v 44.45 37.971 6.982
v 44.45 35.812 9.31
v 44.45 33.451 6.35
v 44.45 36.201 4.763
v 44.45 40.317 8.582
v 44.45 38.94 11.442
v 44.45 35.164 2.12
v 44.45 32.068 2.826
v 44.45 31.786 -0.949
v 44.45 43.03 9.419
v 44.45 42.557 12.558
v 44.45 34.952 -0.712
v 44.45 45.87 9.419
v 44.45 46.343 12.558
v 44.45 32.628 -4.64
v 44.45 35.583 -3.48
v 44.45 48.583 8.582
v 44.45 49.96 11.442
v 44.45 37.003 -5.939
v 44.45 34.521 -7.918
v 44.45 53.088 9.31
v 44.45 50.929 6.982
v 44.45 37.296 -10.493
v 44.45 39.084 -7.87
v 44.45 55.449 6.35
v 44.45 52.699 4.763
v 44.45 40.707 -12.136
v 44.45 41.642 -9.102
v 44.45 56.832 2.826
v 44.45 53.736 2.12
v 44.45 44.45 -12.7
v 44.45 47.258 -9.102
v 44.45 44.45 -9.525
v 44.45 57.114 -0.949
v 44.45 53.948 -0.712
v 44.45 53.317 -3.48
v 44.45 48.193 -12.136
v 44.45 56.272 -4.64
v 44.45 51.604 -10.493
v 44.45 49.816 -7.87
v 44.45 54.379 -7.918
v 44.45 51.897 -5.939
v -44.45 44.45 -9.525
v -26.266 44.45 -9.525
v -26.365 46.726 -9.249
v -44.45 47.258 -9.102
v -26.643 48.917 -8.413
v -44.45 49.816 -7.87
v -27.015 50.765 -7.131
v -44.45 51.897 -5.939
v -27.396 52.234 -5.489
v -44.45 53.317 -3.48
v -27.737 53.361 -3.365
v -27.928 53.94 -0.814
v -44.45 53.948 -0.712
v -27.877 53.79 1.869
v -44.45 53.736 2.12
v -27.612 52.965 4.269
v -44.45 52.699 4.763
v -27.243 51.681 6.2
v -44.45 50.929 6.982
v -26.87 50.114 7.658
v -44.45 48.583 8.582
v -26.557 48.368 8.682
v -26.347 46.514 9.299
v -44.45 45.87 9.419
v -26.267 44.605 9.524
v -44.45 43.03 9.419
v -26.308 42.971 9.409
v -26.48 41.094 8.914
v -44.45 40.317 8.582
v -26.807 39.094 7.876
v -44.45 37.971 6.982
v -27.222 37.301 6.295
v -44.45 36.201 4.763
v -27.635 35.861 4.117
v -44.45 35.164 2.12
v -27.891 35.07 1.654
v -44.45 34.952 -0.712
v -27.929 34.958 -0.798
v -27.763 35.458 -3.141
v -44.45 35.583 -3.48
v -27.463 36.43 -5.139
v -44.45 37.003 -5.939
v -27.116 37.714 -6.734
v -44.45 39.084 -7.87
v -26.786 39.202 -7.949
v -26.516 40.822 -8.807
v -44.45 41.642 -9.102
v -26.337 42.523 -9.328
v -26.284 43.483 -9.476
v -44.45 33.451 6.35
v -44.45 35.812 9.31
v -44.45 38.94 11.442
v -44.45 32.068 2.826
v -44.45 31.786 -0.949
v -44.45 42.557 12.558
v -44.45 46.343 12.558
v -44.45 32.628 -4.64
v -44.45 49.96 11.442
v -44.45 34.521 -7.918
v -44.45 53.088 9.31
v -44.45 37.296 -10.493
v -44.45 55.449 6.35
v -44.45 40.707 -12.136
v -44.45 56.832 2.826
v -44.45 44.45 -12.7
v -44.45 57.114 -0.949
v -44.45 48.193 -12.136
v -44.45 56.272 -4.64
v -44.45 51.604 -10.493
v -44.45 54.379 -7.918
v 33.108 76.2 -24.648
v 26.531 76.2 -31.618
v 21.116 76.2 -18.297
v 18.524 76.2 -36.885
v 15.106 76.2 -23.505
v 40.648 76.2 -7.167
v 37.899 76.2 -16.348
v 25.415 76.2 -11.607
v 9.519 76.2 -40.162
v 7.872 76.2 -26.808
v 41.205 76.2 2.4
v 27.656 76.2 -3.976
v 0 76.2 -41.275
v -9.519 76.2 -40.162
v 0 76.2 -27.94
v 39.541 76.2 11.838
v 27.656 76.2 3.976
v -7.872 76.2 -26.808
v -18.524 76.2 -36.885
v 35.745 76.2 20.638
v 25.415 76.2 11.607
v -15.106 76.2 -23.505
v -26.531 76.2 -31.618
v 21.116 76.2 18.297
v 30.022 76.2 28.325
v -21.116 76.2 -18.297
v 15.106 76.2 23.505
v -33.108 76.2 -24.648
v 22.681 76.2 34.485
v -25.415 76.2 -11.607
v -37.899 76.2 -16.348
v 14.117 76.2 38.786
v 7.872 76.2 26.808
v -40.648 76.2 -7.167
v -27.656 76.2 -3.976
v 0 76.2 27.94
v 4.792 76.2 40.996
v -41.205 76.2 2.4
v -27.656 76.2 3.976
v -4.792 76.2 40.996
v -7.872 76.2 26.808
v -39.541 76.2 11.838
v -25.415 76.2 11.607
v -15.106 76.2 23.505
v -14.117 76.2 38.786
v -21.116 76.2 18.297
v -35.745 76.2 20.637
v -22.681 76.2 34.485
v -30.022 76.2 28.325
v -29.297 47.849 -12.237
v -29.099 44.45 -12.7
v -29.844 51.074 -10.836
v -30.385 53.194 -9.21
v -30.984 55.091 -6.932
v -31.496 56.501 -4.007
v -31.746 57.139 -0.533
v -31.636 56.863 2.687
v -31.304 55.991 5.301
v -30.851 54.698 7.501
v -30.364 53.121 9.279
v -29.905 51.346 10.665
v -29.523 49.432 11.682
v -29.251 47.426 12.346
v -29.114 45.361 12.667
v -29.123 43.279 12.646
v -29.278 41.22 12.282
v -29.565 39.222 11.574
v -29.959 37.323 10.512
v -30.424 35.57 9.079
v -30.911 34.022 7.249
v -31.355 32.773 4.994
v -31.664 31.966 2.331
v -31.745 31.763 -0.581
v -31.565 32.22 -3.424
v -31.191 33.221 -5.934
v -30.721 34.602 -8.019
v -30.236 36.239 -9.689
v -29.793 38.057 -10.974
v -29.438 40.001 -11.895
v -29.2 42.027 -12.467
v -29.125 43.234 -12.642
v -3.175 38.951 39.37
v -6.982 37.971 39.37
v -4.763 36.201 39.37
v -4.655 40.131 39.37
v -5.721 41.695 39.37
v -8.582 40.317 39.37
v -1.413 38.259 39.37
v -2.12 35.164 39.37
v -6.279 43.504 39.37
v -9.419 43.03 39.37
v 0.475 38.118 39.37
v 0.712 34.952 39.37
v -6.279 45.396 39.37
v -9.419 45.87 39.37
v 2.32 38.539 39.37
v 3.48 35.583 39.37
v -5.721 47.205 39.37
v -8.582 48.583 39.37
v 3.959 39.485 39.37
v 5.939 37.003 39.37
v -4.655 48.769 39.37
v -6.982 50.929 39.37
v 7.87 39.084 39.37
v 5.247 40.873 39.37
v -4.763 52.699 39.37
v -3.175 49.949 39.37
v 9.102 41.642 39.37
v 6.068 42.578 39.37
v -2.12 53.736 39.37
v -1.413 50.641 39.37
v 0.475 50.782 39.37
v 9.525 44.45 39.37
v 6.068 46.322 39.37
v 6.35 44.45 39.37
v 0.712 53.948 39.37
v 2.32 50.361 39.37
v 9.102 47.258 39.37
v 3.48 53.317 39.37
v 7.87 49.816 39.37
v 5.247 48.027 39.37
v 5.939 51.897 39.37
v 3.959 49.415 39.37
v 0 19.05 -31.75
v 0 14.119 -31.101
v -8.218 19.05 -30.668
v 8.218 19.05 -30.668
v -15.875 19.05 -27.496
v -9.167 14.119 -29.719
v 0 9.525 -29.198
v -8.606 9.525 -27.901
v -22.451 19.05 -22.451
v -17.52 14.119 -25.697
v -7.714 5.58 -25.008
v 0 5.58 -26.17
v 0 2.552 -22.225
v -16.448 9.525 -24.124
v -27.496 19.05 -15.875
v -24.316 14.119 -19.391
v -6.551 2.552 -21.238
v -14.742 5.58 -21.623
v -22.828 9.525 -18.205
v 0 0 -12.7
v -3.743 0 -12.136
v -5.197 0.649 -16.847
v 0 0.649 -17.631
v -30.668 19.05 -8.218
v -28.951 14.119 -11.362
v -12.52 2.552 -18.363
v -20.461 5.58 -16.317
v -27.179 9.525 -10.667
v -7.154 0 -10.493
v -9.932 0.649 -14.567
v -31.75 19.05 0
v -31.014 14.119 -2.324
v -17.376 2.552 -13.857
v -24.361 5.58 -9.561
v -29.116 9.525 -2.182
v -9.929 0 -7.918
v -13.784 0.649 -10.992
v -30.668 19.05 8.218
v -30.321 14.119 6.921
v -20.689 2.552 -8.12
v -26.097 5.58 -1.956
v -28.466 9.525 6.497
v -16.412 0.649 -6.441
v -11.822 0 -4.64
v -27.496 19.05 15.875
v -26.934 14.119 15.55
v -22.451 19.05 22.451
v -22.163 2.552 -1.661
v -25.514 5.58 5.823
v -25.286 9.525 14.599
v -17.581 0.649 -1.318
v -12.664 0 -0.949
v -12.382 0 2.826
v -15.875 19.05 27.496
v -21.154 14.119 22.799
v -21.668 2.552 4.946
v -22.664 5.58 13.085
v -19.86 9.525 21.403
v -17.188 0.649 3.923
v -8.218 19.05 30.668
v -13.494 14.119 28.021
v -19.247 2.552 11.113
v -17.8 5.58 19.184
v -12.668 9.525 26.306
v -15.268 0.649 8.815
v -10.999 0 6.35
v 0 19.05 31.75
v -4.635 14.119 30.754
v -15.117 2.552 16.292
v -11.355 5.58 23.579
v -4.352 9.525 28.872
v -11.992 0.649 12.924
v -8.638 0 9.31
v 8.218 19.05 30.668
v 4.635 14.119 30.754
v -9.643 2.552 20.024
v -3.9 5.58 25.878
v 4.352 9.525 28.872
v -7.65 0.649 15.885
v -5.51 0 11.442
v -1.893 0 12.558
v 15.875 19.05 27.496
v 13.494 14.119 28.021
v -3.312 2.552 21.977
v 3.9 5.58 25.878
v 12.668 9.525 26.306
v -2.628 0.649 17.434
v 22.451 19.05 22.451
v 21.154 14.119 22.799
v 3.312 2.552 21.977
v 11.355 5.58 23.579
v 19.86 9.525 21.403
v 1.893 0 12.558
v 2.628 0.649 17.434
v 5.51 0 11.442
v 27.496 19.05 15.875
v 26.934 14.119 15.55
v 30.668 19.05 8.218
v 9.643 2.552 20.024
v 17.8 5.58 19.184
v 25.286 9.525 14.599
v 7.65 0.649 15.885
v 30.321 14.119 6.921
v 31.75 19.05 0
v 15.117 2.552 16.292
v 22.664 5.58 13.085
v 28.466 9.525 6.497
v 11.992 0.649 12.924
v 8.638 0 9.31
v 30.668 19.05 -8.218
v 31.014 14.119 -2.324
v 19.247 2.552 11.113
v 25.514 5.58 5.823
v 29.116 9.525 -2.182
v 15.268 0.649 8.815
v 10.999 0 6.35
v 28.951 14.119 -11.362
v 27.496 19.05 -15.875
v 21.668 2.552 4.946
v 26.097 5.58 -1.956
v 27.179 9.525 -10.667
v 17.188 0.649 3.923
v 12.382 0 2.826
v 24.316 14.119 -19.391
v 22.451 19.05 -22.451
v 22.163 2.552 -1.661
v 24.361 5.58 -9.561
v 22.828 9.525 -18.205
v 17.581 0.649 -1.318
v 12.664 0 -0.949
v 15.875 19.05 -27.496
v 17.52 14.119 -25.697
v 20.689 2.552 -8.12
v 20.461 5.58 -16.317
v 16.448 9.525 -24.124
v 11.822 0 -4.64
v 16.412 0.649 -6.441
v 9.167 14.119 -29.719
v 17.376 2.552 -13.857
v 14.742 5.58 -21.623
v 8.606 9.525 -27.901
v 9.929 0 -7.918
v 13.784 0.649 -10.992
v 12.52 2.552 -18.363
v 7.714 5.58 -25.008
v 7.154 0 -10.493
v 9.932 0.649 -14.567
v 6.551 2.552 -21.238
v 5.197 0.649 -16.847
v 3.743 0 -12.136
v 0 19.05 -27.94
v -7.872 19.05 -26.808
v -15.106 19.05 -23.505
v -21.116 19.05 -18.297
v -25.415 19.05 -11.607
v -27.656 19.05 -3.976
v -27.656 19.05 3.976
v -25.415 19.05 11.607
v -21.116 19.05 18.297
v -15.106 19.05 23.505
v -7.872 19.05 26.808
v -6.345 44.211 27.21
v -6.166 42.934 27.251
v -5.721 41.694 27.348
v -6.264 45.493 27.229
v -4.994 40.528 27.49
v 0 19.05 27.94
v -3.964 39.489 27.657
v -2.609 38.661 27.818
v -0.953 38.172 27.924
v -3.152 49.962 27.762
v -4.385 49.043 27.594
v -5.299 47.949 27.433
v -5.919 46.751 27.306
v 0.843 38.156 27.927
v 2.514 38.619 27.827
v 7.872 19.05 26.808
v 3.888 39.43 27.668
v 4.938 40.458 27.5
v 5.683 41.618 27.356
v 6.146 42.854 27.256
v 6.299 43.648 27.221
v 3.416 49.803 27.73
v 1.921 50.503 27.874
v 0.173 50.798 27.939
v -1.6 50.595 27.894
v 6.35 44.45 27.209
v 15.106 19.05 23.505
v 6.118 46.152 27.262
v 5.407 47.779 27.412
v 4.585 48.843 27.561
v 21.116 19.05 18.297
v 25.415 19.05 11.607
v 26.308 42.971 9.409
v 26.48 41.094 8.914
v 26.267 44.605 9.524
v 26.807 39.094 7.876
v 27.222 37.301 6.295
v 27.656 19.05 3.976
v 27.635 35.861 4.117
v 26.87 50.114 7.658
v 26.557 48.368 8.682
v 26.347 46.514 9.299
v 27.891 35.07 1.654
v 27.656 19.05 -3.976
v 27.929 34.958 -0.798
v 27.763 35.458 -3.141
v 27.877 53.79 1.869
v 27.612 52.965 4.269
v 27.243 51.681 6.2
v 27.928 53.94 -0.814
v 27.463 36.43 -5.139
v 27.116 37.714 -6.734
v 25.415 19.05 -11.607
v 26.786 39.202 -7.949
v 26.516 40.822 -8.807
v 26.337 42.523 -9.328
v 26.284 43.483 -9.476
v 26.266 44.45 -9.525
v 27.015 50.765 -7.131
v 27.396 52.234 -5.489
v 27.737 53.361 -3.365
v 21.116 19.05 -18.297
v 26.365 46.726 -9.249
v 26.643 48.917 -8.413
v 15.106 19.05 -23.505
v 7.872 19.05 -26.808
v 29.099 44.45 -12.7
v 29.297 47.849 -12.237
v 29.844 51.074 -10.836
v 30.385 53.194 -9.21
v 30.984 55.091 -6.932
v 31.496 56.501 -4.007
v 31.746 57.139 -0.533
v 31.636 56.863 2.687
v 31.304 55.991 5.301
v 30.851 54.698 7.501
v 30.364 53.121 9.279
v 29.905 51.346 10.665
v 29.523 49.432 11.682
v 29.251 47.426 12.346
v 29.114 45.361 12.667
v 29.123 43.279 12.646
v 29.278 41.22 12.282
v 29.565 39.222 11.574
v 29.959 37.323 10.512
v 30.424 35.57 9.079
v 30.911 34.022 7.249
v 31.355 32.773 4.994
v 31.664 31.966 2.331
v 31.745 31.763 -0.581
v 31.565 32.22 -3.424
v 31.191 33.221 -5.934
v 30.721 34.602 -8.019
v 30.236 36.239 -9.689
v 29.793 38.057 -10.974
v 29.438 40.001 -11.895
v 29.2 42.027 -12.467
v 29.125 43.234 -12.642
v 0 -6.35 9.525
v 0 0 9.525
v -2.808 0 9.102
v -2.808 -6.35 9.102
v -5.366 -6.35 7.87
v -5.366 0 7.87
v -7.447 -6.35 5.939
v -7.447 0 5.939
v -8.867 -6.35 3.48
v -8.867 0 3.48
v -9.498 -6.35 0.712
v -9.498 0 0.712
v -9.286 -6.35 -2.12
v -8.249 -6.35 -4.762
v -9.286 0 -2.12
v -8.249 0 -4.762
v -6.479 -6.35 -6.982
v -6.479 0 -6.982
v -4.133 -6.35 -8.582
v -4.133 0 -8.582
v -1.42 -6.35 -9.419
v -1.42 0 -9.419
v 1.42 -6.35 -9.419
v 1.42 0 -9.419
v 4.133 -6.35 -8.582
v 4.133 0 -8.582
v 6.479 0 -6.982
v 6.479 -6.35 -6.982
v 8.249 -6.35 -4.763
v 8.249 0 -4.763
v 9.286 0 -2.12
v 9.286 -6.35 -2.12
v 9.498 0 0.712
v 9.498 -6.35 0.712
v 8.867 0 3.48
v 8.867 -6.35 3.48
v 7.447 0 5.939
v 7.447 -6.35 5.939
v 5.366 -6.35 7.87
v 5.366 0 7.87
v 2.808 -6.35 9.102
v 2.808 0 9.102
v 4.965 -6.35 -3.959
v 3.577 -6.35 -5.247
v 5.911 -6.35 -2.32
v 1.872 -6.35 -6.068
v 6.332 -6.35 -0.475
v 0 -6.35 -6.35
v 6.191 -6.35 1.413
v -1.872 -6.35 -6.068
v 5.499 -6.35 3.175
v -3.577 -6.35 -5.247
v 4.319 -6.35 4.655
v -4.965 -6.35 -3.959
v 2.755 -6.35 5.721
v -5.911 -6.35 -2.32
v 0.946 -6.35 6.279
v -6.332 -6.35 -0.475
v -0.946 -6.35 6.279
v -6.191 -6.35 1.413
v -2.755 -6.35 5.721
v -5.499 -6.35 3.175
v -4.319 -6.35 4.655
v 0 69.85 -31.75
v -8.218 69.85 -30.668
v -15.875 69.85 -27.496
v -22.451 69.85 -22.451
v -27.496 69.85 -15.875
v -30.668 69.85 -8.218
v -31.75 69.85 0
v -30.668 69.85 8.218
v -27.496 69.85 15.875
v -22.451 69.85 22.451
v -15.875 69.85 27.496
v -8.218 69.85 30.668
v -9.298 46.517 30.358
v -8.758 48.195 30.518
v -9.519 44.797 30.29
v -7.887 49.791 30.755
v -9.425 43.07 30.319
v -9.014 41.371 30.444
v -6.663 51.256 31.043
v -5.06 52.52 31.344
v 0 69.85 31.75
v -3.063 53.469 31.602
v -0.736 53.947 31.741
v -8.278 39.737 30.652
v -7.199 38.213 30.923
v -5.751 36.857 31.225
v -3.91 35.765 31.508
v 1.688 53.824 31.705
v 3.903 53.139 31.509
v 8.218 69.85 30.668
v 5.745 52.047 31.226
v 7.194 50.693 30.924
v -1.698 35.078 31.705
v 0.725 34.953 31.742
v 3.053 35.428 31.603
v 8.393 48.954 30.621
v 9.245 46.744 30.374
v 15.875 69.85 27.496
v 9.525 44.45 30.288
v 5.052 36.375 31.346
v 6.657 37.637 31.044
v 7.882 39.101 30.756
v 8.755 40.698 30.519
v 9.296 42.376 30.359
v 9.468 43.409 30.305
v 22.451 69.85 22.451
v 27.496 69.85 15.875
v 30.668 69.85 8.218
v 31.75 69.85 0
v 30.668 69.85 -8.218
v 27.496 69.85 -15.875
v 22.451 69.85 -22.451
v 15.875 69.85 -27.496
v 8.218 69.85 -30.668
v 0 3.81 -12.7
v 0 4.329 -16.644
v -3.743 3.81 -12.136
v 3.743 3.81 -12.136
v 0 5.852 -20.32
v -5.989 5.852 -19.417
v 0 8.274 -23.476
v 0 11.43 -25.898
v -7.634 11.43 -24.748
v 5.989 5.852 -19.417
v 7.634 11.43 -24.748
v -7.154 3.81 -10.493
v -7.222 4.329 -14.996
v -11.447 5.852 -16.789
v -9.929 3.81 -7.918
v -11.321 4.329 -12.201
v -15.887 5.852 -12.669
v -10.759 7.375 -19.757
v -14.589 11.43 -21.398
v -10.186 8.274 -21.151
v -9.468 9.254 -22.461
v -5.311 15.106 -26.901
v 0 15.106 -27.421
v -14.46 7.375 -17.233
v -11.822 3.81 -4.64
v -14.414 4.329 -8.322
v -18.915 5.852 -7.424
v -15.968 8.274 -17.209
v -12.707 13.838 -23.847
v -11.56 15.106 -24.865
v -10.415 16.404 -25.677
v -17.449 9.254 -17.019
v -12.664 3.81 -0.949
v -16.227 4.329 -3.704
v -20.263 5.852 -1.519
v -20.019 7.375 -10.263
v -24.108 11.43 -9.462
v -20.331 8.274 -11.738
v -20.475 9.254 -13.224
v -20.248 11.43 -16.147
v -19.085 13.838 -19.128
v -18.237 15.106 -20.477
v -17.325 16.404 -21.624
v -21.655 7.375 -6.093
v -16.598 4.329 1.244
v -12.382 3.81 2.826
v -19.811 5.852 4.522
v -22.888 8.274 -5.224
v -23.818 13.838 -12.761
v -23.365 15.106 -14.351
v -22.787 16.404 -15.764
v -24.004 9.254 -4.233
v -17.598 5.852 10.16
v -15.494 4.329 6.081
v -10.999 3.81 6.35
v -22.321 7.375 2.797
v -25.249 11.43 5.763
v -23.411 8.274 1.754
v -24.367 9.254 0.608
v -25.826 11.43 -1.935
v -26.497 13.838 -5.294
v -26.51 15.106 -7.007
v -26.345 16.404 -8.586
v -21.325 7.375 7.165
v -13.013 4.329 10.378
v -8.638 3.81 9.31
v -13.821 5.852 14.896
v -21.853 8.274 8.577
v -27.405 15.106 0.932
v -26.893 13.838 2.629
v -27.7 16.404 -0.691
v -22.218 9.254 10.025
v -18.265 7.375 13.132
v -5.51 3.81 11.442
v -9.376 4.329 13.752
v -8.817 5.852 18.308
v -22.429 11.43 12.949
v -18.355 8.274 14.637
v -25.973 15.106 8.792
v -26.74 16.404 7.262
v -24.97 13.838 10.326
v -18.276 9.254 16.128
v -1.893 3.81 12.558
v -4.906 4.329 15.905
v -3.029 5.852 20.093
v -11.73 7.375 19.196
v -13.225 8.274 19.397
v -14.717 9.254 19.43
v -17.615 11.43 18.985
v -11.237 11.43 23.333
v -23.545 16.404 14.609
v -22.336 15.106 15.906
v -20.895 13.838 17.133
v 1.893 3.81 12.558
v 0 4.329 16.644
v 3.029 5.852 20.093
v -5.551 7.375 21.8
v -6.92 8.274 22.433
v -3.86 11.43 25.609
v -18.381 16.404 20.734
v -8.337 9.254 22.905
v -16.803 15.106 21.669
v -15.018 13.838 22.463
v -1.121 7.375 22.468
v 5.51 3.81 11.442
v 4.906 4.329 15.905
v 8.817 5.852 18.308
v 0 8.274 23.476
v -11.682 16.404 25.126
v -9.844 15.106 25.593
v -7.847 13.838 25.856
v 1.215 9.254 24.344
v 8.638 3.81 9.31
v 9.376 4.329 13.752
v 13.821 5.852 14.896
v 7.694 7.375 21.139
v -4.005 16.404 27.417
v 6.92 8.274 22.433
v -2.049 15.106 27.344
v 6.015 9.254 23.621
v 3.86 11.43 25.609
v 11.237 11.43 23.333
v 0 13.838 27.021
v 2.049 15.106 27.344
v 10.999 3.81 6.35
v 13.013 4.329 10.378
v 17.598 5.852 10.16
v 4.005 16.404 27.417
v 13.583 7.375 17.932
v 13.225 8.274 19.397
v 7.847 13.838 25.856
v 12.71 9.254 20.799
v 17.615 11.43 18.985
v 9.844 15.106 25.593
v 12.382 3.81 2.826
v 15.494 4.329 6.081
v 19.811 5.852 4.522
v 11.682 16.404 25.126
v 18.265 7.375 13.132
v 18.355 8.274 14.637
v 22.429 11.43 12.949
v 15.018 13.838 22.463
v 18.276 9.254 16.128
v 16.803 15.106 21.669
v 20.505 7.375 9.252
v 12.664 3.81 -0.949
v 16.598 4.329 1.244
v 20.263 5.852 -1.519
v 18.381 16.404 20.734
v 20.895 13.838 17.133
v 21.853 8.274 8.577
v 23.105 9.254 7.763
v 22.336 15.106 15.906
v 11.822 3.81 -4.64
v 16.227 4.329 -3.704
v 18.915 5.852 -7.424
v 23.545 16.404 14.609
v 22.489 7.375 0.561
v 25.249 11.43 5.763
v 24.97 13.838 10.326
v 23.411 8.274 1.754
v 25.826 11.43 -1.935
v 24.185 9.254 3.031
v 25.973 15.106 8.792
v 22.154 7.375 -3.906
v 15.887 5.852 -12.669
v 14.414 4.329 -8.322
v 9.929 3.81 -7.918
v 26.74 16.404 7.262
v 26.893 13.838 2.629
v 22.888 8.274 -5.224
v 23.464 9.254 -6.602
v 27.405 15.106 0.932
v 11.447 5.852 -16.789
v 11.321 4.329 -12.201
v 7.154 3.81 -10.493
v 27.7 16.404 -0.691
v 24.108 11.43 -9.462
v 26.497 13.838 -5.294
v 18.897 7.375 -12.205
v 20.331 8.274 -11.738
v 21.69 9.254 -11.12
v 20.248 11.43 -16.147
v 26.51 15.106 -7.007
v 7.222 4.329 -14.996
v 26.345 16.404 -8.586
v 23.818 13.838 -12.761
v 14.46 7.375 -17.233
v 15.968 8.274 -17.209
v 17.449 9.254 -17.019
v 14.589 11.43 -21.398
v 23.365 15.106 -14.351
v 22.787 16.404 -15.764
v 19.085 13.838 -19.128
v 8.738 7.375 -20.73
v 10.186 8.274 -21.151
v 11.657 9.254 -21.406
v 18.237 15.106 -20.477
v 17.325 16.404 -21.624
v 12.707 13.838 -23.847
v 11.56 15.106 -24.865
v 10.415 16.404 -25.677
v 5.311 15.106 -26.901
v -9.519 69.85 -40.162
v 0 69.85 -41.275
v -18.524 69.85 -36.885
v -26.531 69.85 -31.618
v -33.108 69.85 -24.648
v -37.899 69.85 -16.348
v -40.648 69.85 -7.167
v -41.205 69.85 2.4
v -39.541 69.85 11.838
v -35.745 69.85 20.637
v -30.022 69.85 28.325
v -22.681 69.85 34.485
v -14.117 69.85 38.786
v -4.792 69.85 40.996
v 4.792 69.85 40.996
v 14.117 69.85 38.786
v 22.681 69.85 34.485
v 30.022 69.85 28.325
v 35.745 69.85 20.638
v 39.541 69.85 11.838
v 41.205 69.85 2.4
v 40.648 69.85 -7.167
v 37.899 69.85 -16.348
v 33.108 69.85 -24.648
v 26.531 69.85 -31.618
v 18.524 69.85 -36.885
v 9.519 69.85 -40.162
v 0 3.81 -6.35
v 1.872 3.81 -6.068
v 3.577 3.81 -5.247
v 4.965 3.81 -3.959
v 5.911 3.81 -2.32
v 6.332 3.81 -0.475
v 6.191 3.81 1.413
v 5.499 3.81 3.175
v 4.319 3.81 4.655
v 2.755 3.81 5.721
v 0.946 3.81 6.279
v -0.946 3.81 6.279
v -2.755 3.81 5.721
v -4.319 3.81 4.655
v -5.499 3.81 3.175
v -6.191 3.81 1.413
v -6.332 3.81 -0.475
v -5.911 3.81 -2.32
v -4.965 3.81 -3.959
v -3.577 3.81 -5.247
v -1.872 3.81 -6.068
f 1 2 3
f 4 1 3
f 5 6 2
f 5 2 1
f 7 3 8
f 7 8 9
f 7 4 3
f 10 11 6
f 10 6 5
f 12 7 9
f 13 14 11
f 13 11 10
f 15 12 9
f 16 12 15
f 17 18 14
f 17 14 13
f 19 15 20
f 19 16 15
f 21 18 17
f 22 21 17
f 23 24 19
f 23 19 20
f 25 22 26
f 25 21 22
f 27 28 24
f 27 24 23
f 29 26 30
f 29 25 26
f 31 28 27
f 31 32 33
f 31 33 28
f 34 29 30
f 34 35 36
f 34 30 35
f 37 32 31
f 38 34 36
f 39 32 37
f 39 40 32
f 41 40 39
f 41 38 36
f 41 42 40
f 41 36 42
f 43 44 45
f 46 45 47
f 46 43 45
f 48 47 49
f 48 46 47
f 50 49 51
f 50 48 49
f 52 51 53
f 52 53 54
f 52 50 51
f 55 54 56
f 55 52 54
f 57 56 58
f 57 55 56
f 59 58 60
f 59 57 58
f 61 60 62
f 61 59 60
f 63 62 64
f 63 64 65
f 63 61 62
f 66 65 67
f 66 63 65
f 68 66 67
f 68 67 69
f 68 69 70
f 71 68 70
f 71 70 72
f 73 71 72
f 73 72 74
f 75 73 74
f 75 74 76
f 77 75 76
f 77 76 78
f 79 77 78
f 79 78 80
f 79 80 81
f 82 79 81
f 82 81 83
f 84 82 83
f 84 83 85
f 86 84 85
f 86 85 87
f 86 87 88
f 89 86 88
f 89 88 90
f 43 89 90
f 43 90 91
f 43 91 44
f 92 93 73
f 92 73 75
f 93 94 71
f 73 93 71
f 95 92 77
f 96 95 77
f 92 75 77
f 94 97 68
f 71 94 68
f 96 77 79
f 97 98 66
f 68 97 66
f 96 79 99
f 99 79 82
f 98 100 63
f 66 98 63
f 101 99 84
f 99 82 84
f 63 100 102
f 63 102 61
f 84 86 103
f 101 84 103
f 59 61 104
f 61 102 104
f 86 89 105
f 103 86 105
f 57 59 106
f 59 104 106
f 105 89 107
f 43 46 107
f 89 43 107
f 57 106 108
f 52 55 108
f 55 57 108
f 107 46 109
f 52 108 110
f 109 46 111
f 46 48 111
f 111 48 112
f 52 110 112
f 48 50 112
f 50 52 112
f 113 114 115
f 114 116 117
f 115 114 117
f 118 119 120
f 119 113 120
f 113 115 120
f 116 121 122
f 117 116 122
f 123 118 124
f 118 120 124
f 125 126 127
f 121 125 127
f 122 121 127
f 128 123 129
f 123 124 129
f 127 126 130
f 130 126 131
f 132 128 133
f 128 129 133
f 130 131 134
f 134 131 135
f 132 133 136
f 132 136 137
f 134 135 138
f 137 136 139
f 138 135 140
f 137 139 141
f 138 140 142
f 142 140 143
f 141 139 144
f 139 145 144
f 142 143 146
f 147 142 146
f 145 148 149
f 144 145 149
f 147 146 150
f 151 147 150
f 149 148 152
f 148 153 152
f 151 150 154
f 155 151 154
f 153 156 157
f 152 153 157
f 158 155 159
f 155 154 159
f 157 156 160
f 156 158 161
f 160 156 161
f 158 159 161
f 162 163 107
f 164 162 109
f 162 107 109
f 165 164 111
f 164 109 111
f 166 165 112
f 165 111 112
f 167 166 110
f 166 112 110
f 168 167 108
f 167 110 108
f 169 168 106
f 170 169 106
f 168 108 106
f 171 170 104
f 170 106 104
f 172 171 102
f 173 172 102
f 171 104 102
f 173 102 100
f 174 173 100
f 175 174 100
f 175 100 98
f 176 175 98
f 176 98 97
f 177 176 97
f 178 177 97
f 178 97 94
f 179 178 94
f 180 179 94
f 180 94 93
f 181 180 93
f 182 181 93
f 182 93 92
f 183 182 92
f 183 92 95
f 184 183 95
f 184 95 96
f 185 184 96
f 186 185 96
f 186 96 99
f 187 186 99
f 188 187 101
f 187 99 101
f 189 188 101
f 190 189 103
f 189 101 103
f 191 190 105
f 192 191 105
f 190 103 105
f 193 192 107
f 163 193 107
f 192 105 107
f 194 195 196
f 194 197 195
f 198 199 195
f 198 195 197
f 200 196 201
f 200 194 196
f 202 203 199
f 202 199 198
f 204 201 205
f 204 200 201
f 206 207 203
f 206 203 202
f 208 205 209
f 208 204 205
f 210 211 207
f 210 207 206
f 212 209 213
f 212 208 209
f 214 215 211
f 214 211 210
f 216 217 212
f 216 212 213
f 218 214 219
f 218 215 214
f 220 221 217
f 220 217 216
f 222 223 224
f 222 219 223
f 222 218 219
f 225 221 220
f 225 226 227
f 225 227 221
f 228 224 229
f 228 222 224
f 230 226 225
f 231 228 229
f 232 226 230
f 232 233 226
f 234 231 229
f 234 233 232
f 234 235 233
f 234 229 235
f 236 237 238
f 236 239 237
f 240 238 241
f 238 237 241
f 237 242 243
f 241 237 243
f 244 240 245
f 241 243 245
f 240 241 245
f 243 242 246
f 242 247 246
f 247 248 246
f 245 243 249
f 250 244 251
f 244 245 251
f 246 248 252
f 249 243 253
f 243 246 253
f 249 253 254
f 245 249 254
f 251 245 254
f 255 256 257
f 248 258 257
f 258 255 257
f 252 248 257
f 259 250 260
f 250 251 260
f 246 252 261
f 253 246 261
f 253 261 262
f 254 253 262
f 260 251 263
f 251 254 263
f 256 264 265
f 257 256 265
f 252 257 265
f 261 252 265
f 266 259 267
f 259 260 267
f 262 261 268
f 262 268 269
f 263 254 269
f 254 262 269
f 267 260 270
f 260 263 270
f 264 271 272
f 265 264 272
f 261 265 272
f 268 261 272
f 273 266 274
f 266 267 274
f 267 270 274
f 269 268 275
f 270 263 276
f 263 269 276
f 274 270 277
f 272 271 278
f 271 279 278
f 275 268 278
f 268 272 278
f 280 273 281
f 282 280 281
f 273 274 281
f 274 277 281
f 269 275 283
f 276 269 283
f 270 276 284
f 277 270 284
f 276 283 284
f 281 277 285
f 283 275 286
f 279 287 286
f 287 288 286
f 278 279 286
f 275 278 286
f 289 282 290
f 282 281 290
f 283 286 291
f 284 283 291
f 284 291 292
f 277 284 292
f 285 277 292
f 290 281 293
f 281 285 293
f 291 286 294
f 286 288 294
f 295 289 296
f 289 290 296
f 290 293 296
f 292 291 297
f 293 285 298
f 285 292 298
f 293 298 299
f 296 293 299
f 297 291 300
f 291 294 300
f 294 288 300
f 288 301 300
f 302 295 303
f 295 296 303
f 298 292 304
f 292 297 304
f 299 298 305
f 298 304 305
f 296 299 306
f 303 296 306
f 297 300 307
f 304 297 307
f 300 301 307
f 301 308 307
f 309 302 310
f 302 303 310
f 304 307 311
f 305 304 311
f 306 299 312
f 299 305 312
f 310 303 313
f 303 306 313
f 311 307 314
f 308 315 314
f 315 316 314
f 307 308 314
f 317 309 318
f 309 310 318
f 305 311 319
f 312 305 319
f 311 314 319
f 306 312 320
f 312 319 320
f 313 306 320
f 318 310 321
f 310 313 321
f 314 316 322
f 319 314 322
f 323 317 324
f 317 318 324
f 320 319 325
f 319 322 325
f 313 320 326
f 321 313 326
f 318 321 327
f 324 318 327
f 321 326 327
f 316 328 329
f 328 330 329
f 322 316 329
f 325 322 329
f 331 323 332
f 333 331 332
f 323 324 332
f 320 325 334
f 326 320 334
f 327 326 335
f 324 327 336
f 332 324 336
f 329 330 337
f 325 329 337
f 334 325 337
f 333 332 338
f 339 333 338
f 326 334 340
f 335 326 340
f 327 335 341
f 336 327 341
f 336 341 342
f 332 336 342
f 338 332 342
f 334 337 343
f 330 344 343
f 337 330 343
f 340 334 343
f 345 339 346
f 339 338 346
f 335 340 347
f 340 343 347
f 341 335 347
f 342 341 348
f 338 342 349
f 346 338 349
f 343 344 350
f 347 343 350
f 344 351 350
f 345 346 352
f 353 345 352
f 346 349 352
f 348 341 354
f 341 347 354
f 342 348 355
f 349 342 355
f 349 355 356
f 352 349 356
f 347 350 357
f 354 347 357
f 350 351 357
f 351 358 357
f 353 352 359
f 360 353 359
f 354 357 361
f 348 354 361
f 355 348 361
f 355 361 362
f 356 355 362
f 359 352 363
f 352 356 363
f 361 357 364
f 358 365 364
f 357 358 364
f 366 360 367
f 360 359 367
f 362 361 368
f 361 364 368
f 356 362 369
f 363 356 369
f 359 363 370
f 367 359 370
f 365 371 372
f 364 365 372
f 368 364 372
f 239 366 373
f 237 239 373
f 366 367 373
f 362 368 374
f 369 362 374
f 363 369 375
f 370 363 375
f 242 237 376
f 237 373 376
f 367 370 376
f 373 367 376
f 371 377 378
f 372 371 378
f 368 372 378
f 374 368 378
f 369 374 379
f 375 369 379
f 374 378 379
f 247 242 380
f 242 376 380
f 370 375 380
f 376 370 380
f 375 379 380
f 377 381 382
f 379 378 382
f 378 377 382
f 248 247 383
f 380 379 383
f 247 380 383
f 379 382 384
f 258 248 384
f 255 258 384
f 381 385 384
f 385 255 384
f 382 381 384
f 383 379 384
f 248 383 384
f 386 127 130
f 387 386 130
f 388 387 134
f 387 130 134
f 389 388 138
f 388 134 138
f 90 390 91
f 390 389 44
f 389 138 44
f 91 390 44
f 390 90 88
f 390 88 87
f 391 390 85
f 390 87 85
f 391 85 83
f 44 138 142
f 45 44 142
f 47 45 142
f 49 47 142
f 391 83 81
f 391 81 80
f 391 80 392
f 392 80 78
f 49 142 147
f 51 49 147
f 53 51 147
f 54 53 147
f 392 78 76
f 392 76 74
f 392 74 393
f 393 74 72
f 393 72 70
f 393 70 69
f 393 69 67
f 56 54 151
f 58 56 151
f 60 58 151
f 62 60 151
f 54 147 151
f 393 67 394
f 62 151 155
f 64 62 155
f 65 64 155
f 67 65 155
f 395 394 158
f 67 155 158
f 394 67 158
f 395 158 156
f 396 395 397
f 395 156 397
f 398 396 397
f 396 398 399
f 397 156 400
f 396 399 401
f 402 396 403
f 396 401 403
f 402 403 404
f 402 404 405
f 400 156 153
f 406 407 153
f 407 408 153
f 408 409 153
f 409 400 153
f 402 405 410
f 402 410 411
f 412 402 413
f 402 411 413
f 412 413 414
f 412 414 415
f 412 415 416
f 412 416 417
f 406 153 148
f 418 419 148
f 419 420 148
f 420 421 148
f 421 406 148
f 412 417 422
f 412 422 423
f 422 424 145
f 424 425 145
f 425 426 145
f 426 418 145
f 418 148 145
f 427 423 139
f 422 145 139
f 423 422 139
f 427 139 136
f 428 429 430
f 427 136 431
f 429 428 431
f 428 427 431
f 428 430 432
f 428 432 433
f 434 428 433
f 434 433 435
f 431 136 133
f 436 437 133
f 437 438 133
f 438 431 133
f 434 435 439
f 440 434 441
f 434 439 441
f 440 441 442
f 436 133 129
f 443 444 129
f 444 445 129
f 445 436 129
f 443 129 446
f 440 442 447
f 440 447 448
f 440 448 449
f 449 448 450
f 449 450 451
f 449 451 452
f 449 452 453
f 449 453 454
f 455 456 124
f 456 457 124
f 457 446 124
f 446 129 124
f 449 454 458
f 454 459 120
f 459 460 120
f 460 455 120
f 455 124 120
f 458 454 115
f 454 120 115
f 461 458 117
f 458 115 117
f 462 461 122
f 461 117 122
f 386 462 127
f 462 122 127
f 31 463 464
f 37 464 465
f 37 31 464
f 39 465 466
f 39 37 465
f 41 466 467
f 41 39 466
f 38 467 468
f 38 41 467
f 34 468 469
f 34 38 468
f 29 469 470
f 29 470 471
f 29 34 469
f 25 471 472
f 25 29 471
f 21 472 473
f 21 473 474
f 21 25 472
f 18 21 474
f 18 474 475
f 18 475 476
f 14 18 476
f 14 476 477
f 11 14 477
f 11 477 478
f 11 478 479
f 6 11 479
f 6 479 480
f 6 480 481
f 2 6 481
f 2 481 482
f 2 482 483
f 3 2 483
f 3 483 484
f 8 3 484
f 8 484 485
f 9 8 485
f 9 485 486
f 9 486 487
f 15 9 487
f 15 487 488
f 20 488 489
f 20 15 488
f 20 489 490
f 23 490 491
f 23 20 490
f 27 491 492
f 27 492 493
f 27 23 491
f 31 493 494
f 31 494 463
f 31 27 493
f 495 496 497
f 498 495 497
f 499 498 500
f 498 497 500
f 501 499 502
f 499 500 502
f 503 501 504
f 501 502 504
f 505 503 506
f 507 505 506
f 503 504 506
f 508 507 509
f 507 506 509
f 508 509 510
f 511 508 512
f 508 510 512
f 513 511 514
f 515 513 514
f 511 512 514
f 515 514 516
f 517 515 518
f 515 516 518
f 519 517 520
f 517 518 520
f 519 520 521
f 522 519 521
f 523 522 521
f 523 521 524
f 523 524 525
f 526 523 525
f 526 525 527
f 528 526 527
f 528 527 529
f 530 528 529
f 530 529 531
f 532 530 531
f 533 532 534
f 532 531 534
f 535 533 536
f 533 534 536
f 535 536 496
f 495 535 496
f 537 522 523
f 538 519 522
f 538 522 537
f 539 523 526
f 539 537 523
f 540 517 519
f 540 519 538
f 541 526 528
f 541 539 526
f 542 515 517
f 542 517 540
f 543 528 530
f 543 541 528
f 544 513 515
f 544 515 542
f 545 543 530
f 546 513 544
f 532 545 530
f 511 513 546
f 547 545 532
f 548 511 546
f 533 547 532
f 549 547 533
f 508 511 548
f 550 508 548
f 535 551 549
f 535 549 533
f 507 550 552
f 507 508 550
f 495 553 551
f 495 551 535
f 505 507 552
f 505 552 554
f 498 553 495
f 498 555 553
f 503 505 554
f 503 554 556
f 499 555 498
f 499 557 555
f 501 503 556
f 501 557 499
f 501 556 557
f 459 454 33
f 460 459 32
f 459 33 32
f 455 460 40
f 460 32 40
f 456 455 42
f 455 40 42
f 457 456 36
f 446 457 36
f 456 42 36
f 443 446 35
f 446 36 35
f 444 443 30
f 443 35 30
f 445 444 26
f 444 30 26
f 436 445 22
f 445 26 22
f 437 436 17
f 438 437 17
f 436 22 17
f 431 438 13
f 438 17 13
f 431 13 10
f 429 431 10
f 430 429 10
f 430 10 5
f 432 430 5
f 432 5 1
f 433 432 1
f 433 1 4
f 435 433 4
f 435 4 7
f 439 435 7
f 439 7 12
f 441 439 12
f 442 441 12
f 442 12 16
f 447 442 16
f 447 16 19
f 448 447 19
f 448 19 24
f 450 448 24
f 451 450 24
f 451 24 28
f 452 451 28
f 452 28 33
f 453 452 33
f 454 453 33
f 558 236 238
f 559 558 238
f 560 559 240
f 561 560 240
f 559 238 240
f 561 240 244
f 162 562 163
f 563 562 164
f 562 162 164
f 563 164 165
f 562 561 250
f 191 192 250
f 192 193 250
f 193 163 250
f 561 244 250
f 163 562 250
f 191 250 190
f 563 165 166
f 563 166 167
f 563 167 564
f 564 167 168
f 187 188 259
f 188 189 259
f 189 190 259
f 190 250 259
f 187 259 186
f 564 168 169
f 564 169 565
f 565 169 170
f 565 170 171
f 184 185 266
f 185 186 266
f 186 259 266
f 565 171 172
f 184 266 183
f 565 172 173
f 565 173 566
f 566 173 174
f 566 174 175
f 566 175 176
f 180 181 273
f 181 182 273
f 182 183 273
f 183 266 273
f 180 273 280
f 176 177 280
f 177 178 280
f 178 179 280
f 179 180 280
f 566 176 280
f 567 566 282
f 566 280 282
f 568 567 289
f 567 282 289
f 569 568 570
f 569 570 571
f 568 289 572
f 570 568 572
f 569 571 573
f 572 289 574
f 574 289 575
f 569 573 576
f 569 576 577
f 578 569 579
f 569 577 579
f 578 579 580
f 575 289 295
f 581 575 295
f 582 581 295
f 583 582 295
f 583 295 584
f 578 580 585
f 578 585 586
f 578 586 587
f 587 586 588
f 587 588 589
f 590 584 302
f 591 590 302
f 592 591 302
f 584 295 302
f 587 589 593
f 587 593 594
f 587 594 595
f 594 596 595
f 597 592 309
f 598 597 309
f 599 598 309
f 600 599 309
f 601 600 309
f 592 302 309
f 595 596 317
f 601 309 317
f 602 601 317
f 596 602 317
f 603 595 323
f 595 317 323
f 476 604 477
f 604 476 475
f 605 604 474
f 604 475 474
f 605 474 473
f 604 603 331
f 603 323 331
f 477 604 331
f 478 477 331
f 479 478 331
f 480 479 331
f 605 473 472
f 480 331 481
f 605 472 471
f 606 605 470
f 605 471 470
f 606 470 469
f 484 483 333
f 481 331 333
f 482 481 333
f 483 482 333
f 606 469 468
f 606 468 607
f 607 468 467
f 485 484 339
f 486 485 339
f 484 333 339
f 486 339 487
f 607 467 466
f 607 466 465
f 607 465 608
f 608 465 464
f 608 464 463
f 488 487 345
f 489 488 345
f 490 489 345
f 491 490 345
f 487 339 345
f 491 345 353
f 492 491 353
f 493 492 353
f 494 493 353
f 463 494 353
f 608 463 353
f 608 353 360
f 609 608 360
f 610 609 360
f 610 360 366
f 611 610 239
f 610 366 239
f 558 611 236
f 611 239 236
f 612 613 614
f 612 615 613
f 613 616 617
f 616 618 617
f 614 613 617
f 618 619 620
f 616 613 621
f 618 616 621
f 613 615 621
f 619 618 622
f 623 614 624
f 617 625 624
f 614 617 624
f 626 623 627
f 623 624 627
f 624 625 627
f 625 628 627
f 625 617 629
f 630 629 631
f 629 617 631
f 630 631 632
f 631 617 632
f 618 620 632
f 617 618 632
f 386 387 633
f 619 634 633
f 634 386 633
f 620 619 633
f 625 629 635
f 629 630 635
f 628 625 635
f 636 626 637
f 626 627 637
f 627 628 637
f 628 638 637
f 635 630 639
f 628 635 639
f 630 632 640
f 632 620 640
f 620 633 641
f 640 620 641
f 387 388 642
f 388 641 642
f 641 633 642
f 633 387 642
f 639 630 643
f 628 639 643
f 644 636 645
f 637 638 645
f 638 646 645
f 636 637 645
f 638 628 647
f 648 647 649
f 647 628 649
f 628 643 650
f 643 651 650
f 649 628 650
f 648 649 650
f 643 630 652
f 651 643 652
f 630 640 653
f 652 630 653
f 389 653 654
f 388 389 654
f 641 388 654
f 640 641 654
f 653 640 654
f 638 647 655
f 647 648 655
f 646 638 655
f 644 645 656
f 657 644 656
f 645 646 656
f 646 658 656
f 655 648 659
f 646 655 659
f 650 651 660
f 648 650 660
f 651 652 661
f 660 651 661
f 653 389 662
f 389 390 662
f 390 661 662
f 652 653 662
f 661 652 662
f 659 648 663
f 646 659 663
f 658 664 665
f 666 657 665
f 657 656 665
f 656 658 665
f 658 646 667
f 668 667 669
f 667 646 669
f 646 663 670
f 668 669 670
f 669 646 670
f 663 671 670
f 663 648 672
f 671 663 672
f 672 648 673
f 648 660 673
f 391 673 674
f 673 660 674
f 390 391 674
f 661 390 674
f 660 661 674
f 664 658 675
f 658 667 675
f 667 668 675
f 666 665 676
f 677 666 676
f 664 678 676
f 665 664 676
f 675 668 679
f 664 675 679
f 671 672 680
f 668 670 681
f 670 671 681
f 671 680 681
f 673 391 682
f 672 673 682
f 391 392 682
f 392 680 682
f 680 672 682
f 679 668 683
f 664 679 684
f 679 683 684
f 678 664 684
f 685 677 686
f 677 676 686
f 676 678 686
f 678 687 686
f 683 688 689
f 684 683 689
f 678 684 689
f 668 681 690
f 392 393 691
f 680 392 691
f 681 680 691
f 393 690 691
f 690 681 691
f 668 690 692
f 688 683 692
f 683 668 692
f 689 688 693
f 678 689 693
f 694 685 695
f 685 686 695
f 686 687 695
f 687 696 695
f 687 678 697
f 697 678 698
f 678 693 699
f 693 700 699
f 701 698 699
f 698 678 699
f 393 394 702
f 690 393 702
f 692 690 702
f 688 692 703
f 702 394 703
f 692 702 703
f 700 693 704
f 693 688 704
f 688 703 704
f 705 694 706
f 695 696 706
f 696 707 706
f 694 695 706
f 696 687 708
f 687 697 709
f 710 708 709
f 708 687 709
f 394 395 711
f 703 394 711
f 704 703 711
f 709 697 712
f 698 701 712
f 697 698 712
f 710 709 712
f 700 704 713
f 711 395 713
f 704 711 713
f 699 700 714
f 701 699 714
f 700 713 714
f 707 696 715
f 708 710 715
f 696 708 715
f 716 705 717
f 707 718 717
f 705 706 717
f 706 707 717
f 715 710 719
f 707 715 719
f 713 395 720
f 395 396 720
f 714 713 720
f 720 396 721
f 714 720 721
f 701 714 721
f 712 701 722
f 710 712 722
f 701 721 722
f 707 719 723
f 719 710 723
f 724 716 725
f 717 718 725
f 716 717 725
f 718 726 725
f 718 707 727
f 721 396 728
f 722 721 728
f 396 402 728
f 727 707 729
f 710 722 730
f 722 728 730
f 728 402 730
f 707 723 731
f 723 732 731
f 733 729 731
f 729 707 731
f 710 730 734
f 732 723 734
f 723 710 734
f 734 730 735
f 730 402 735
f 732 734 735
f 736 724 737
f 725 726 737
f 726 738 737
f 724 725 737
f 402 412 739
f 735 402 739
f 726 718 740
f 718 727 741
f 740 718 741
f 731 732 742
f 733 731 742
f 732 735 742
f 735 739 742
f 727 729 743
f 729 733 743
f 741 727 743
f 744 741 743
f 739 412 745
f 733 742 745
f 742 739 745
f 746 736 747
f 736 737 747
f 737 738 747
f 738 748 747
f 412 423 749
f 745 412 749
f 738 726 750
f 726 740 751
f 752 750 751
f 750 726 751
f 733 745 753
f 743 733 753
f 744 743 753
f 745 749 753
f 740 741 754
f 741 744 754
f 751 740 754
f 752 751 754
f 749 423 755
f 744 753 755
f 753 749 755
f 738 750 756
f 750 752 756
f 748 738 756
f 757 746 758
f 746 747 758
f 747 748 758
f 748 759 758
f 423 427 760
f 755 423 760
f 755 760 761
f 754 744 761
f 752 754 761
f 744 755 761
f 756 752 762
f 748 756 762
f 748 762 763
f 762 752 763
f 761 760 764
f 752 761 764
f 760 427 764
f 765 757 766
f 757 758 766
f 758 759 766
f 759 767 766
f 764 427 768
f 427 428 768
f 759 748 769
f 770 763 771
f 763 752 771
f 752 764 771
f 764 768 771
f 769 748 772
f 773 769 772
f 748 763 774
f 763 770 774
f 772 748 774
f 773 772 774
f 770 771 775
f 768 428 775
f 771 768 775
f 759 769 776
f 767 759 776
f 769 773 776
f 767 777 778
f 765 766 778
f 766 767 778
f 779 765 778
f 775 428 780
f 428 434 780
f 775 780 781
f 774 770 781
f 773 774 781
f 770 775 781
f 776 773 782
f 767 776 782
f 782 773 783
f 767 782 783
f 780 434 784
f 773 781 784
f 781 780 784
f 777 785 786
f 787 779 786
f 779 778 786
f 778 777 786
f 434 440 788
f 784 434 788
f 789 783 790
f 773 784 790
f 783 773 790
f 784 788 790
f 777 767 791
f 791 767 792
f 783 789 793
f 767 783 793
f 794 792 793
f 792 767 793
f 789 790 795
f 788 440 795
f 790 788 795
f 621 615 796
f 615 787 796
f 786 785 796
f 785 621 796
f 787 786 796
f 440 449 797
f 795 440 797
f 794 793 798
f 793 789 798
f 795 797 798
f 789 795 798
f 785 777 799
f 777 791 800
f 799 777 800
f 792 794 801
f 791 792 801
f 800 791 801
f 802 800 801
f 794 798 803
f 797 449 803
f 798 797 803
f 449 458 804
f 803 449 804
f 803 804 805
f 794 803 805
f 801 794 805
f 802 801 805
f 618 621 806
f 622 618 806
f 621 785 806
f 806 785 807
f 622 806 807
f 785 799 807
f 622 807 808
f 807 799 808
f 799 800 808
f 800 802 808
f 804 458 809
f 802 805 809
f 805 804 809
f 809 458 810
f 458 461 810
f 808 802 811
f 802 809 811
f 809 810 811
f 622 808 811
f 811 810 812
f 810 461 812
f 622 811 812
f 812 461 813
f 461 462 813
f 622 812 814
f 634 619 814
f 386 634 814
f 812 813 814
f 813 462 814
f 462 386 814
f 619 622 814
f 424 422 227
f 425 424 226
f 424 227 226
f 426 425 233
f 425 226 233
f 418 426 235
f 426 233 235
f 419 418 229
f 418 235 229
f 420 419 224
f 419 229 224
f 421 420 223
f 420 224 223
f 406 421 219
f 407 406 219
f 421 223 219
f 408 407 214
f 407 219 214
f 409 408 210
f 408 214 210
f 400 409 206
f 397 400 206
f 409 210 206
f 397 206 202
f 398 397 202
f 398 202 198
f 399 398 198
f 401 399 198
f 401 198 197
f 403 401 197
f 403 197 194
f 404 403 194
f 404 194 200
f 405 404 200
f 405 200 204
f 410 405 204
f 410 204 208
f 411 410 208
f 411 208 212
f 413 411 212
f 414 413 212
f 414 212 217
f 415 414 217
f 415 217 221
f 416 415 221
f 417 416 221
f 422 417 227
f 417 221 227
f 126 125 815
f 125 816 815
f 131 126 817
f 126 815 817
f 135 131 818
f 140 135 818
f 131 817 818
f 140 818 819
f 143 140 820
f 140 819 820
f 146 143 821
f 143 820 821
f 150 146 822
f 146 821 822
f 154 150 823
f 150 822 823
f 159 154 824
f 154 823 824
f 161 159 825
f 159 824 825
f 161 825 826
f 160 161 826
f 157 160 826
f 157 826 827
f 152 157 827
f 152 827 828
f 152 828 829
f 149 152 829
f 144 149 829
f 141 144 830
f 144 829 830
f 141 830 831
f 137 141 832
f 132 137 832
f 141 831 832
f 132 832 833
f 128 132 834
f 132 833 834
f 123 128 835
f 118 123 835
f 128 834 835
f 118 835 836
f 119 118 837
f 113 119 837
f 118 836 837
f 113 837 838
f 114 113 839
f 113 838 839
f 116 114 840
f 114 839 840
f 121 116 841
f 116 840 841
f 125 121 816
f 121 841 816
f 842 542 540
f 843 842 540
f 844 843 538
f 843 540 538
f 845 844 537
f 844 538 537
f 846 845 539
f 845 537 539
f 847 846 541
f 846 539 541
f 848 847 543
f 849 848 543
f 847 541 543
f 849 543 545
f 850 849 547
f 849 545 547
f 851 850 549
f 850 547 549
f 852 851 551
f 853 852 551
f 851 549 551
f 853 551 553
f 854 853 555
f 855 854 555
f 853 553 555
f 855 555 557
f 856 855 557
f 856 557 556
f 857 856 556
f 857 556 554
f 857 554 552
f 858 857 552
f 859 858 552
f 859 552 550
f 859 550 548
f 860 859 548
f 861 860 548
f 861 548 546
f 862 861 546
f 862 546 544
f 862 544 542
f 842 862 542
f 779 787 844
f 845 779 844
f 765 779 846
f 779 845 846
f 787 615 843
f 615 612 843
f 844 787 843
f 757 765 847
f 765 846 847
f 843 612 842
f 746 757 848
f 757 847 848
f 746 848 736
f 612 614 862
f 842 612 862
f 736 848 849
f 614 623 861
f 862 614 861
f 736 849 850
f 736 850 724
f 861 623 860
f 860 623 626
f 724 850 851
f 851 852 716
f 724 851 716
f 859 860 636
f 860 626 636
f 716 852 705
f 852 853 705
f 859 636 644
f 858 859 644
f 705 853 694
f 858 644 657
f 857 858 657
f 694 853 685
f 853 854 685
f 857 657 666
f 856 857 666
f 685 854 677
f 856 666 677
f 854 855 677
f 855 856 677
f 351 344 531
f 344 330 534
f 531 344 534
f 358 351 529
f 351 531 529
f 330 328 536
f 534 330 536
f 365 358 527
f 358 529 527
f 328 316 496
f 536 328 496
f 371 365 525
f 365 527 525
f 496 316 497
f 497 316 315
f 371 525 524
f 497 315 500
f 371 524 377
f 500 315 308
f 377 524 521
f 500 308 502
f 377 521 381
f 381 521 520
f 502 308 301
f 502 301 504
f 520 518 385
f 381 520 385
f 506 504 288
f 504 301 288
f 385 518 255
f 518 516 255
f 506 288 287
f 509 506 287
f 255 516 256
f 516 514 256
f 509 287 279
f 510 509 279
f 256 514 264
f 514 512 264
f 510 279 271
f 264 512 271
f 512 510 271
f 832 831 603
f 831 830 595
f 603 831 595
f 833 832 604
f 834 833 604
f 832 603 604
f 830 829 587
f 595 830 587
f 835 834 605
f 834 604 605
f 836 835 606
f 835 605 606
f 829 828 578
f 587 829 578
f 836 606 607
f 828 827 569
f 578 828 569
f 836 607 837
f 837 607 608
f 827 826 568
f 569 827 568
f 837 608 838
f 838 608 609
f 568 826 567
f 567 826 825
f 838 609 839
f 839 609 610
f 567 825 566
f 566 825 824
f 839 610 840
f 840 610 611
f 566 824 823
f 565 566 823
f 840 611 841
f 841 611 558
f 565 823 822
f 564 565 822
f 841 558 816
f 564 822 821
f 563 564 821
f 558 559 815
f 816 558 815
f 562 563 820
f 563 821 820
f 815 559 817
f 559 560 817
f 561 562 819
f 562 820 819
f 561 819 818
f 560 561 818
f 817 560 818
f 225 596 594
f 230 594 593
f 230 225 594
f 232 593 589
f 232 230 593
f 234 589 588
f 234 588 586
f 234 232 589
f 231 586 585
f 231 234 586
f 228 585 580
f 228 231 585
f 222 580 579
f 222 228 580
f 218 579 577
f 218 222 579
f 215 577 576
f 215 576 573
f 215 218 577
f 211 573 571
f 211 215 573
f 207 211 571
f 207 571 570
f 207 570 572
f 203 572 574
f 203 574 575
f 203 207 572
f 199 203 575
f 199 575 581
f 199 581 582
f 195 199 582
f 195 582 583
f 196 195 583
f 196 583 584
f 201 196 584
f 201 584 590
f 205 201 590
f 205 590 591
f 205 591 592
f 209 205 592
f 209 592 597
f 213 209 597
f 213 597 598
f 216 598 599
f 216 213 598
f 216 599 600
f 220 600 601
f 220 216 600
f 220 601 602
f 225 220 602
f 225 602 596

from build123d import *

# Parameters (mm, degrees)
BOSS_EXTRUDE1_REACH      = 123.897
BOSS_EXTRUDE1_END_RADIUS = 31.75
SKETCH2_R                = 12.7
CUT_EXTRUDE1_REACH       = 123.897
CUT_EXTRUDE1_END_RADIUS  = 27.94
SKETCH3_R                = 9.525
BOSS_EXTRUDE2_REACH      = 121.523
BOSS_EXTRUDE2_END_RADIUS = 31.75
SKETCH4_R                = 9.525
CUT_EXTRUDE2_REACH       = 121.523
CUT_EXTRUDE2_END_RADIUS  = 27.94
SKETCH5_R                = 6.35
SKETCH6_R                = 9.525
BOSS_EXTRUDE3_DEPTH      = 6.35
CUT_EXTRUDE3_REACH       = 104.44
SKETCH7_R                = 6.35


with BuildPart() as part:
    # Sketch1 → Revolve1 (revolve)
    with BuildSketch(Plane.XY, mode=Mode.PRIVATE) as revolve1_sk:
        with BuildLine():
            Line((-31.75, 69.85), (-31.75, 19.05))
            ThreePointArc((-31.75, 19.05), (-26.170384182, 5.579615818), (-12.7, 0))
            Line((-12.7, 0), (0, 0))
            Line((0, 0), (0, 3.81))
            Line((0, 3.81), (-12.7, 3.81))
            ThreePointArc((-12.7, 3.81), (-23.476307345, 8.273692655), (-27.94, 19.05))
            Line((-27.94, 19.05), (-27.94, 76.2))
            Line((-27.94, 76.2), (-41.275, 76.2))
            Line((-41.275, 76.2), (-41.275, 69.85))
            Line((-41.275, 69.85), (-31.75, 69.85))
        make_face()
    revolve(revolve1_sk.sketch.rotate(Axis((0, 0, 0), (0, 1, 0)), 270), axis=Axis((0, 0, 0), (0, 1, 0)))

    # Boss-Extrude1: up to this cylinder (the profile starts outside it)
    boss_extrude1_end = Plane(origin=(0, 44.45, 0), z_dir=(0, -1, 0)) * Cylinder(BOSS_EXTRUDE1_END_RADIUS, 312.294, mode=Mode.PRIVATE)
    # Sketch2 → Boss-Extrude1 (add, up to the surface)
    with BuildSketch(Plane(origin=(44.45, 0, 0), x_dir=(0, 0, -1), z_dir=(1, 0, 0)), mode=Mode.PRIVATE) as boss_extrude1_sk1:
        with Locations((0, 44.45)):
            Circle(SKETCH2_R)
    boss_extrude1_tool1 = extrude(boss_extrude1_sk1.sketch, amount=-BOSS_EXTRUDE1_REACH, mode=Mode.PRIVATE) - boss_extrude1_end
    boss_extrude1 = boss_extrude1_tool1.solids().sort_by_distance((44.45, 44.45, 0))[0]
    add(boss_extrude1)

    # Cut-Extrude1: up to this cylinder (the profile starts outside it)
    cut_extrude1_end = Plane(origin=(0, 44.45, 0), z_dir=(0, -1, 0)) * Cylinder(CUT_EXTRUDE1_END_RADIUS, 304.674, mode=Mode.PRIVATE)
    # Sketch3 → Cut-Extrude1 (cut, up to the surface)
    with BuildSketch(Plane(origin=(44.45, 0, 0), x_dir=(0, 0, -1), z_dir=(1, 0, 0)), mode=Mode.PRIVATE) as cut_extrude1_sk1:
        with Locations((0, 44.45)):
            Circle(SKETCH3_R)
    cut_extrude1_tool1 = extrude(cut_extrude1_sk1.sketch, amount=-CUT_EXTRUDE1_REACH, mode=Mode.PRIVATE) - cut_extrude1_end
    cut_extrude1 = cut_extrude1_tool1.solids().sort_by_distance((44.45, 44.45, 0))[0]
    add(cut_extrude1, mode=Mode.SUBTRACT)

    # Mirror3: Boss-Extrude1, Cut-Extrude1 across plane
    add(boss_extrude1.mirror(Plane(origin=(0, 0, 0), x_dir=(0, 0, 1), z_dir=(1, 0, 0))))
    add(cut_extrude1.mirror(Plane(origin=(0, 0, 0), x_dir=(0, 0, 1), z_dir=(1, 0, 0))), mode=Mode.SUBTRACT)

    # Boss-Extrude2: up to this cylinder (the profile starts outside it)
    boss_extrude2_end = Plane(origin=(0, 44.45, 0), z_dir=(0, -1, 0)) * Cylinder(BOSS_EXTRUDE2_END_RADIUS, 307.546, mode=Mode.PRIVATE)
    # Sketch4 → Boss-Extrude2 (add, up to the surface)
    with BuildSketch(Plane.XY.offset(39.37), mode=Mode.PRIVATE) as boss_extrude2_sk1:
        with Locations((0, 44.45)):
            Circle(SKETCH4_R)
    boss_extrude2_tool1 = extrude(boss_extrude2_sk1.sketch, amount=-BOSS_EXTRUDE2_REACH, mode=Mode.PRIVATE) - boss_extrude2_end
    add(boss_extrude2_tool1.solids().sort_by_distance((0, 44.45, 39.37))[0])

    # Cut-Extrude2: up to this cylinder (the profile starts outside it)
    cut_extrude2_end = Plane(origin=(0, 44.45, 0), z_dir=(0, -1, 0)) * Cylinder(CUT_EXTRUDE2_END_RADIUS, 299.926, mode=Mode.PRIVATE)
    # Sketch5 → Cut-Extrude2 (cut, up to the surface)
    with BuildSketch(Plane.XY.offset(39.37), mode=Mode.PRIVATE) as cut_extrude2_sk1:
        with Locations((0, 44.45)):
            Circle(SKETCH5_R)
    cut_extrude2_tool1 = extrude(cut_extrude2_sk1.sketch, amount=-CUT_EXTRUDE2_REACH, mode=Mode.PRIVATE) - cut_extrude2_end
    add(cut_extrude2_tool1.solids().sort_by_distance((0, 44.45, 39.37))[0], mode=Mode.SUBTRACT)

    # Sketch6 → Boss-Extrude3 (add)
    with BuildSketch(Plane.XZ):
        with Locations(Location((0, 0, 0), (0, 0, 90))):
            Circle(SKETCH6_R)
    extrude(amount=BOSS_EXTRUDE3_DEPTH)

    # Sketch7 → Cut-Extrude3 (cut, up to next)
    with BuildSketch(Plane.XZ.offset(6.35), mode=Mode.PRIVATE) as cut_extrude3_sk1:
        with Locations(Location((0, 0, 0), (0, 0, 270))):
            Circle(SKETCH7_R)
    cut_extrude3_tool1 = extrude(cut_extrude3_sk1.sketch, amount=-CUT_EXTRUDE3_REACH, mode=Mode.PRIVATE) & part.part
    add(cut_extrude3_tool1.solids().sort_by_distance((0, -6.35, 0))[0], mode=Mode.SUBTRACT)


solid = part.part
